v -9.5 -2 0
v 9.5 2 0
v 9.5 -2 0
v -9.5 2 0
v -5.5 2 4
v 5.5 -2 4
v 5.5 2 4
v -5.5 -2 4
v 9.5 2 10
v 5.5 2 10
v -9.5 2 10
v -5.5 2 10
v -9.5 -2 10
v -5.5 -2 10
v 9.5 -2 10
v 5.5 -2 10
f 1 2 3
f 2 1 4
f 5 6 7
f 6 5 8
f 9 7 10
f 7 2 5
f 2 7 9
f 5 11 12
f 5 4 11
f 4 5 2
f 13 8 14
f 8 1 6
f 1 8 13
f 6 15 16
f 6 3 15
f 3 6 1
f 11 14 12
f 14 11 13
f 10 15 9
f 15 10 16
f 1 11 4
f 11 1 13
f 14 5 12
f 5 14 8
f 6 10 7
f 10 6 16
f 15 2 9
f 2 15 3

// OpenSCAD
module handle(length, thickness, depth, center=true) {
	linear_extrude(thickness)
		square([length, thickness], center);

	translate([center ? -length/2 : 0, 0])
	linear_extrude(depth) {
		square(thickness, center);
		translate([length - (center ? 0 : thickness), 0])
			square(thickness, center);
	}
}

handle(15, 4, 10);
